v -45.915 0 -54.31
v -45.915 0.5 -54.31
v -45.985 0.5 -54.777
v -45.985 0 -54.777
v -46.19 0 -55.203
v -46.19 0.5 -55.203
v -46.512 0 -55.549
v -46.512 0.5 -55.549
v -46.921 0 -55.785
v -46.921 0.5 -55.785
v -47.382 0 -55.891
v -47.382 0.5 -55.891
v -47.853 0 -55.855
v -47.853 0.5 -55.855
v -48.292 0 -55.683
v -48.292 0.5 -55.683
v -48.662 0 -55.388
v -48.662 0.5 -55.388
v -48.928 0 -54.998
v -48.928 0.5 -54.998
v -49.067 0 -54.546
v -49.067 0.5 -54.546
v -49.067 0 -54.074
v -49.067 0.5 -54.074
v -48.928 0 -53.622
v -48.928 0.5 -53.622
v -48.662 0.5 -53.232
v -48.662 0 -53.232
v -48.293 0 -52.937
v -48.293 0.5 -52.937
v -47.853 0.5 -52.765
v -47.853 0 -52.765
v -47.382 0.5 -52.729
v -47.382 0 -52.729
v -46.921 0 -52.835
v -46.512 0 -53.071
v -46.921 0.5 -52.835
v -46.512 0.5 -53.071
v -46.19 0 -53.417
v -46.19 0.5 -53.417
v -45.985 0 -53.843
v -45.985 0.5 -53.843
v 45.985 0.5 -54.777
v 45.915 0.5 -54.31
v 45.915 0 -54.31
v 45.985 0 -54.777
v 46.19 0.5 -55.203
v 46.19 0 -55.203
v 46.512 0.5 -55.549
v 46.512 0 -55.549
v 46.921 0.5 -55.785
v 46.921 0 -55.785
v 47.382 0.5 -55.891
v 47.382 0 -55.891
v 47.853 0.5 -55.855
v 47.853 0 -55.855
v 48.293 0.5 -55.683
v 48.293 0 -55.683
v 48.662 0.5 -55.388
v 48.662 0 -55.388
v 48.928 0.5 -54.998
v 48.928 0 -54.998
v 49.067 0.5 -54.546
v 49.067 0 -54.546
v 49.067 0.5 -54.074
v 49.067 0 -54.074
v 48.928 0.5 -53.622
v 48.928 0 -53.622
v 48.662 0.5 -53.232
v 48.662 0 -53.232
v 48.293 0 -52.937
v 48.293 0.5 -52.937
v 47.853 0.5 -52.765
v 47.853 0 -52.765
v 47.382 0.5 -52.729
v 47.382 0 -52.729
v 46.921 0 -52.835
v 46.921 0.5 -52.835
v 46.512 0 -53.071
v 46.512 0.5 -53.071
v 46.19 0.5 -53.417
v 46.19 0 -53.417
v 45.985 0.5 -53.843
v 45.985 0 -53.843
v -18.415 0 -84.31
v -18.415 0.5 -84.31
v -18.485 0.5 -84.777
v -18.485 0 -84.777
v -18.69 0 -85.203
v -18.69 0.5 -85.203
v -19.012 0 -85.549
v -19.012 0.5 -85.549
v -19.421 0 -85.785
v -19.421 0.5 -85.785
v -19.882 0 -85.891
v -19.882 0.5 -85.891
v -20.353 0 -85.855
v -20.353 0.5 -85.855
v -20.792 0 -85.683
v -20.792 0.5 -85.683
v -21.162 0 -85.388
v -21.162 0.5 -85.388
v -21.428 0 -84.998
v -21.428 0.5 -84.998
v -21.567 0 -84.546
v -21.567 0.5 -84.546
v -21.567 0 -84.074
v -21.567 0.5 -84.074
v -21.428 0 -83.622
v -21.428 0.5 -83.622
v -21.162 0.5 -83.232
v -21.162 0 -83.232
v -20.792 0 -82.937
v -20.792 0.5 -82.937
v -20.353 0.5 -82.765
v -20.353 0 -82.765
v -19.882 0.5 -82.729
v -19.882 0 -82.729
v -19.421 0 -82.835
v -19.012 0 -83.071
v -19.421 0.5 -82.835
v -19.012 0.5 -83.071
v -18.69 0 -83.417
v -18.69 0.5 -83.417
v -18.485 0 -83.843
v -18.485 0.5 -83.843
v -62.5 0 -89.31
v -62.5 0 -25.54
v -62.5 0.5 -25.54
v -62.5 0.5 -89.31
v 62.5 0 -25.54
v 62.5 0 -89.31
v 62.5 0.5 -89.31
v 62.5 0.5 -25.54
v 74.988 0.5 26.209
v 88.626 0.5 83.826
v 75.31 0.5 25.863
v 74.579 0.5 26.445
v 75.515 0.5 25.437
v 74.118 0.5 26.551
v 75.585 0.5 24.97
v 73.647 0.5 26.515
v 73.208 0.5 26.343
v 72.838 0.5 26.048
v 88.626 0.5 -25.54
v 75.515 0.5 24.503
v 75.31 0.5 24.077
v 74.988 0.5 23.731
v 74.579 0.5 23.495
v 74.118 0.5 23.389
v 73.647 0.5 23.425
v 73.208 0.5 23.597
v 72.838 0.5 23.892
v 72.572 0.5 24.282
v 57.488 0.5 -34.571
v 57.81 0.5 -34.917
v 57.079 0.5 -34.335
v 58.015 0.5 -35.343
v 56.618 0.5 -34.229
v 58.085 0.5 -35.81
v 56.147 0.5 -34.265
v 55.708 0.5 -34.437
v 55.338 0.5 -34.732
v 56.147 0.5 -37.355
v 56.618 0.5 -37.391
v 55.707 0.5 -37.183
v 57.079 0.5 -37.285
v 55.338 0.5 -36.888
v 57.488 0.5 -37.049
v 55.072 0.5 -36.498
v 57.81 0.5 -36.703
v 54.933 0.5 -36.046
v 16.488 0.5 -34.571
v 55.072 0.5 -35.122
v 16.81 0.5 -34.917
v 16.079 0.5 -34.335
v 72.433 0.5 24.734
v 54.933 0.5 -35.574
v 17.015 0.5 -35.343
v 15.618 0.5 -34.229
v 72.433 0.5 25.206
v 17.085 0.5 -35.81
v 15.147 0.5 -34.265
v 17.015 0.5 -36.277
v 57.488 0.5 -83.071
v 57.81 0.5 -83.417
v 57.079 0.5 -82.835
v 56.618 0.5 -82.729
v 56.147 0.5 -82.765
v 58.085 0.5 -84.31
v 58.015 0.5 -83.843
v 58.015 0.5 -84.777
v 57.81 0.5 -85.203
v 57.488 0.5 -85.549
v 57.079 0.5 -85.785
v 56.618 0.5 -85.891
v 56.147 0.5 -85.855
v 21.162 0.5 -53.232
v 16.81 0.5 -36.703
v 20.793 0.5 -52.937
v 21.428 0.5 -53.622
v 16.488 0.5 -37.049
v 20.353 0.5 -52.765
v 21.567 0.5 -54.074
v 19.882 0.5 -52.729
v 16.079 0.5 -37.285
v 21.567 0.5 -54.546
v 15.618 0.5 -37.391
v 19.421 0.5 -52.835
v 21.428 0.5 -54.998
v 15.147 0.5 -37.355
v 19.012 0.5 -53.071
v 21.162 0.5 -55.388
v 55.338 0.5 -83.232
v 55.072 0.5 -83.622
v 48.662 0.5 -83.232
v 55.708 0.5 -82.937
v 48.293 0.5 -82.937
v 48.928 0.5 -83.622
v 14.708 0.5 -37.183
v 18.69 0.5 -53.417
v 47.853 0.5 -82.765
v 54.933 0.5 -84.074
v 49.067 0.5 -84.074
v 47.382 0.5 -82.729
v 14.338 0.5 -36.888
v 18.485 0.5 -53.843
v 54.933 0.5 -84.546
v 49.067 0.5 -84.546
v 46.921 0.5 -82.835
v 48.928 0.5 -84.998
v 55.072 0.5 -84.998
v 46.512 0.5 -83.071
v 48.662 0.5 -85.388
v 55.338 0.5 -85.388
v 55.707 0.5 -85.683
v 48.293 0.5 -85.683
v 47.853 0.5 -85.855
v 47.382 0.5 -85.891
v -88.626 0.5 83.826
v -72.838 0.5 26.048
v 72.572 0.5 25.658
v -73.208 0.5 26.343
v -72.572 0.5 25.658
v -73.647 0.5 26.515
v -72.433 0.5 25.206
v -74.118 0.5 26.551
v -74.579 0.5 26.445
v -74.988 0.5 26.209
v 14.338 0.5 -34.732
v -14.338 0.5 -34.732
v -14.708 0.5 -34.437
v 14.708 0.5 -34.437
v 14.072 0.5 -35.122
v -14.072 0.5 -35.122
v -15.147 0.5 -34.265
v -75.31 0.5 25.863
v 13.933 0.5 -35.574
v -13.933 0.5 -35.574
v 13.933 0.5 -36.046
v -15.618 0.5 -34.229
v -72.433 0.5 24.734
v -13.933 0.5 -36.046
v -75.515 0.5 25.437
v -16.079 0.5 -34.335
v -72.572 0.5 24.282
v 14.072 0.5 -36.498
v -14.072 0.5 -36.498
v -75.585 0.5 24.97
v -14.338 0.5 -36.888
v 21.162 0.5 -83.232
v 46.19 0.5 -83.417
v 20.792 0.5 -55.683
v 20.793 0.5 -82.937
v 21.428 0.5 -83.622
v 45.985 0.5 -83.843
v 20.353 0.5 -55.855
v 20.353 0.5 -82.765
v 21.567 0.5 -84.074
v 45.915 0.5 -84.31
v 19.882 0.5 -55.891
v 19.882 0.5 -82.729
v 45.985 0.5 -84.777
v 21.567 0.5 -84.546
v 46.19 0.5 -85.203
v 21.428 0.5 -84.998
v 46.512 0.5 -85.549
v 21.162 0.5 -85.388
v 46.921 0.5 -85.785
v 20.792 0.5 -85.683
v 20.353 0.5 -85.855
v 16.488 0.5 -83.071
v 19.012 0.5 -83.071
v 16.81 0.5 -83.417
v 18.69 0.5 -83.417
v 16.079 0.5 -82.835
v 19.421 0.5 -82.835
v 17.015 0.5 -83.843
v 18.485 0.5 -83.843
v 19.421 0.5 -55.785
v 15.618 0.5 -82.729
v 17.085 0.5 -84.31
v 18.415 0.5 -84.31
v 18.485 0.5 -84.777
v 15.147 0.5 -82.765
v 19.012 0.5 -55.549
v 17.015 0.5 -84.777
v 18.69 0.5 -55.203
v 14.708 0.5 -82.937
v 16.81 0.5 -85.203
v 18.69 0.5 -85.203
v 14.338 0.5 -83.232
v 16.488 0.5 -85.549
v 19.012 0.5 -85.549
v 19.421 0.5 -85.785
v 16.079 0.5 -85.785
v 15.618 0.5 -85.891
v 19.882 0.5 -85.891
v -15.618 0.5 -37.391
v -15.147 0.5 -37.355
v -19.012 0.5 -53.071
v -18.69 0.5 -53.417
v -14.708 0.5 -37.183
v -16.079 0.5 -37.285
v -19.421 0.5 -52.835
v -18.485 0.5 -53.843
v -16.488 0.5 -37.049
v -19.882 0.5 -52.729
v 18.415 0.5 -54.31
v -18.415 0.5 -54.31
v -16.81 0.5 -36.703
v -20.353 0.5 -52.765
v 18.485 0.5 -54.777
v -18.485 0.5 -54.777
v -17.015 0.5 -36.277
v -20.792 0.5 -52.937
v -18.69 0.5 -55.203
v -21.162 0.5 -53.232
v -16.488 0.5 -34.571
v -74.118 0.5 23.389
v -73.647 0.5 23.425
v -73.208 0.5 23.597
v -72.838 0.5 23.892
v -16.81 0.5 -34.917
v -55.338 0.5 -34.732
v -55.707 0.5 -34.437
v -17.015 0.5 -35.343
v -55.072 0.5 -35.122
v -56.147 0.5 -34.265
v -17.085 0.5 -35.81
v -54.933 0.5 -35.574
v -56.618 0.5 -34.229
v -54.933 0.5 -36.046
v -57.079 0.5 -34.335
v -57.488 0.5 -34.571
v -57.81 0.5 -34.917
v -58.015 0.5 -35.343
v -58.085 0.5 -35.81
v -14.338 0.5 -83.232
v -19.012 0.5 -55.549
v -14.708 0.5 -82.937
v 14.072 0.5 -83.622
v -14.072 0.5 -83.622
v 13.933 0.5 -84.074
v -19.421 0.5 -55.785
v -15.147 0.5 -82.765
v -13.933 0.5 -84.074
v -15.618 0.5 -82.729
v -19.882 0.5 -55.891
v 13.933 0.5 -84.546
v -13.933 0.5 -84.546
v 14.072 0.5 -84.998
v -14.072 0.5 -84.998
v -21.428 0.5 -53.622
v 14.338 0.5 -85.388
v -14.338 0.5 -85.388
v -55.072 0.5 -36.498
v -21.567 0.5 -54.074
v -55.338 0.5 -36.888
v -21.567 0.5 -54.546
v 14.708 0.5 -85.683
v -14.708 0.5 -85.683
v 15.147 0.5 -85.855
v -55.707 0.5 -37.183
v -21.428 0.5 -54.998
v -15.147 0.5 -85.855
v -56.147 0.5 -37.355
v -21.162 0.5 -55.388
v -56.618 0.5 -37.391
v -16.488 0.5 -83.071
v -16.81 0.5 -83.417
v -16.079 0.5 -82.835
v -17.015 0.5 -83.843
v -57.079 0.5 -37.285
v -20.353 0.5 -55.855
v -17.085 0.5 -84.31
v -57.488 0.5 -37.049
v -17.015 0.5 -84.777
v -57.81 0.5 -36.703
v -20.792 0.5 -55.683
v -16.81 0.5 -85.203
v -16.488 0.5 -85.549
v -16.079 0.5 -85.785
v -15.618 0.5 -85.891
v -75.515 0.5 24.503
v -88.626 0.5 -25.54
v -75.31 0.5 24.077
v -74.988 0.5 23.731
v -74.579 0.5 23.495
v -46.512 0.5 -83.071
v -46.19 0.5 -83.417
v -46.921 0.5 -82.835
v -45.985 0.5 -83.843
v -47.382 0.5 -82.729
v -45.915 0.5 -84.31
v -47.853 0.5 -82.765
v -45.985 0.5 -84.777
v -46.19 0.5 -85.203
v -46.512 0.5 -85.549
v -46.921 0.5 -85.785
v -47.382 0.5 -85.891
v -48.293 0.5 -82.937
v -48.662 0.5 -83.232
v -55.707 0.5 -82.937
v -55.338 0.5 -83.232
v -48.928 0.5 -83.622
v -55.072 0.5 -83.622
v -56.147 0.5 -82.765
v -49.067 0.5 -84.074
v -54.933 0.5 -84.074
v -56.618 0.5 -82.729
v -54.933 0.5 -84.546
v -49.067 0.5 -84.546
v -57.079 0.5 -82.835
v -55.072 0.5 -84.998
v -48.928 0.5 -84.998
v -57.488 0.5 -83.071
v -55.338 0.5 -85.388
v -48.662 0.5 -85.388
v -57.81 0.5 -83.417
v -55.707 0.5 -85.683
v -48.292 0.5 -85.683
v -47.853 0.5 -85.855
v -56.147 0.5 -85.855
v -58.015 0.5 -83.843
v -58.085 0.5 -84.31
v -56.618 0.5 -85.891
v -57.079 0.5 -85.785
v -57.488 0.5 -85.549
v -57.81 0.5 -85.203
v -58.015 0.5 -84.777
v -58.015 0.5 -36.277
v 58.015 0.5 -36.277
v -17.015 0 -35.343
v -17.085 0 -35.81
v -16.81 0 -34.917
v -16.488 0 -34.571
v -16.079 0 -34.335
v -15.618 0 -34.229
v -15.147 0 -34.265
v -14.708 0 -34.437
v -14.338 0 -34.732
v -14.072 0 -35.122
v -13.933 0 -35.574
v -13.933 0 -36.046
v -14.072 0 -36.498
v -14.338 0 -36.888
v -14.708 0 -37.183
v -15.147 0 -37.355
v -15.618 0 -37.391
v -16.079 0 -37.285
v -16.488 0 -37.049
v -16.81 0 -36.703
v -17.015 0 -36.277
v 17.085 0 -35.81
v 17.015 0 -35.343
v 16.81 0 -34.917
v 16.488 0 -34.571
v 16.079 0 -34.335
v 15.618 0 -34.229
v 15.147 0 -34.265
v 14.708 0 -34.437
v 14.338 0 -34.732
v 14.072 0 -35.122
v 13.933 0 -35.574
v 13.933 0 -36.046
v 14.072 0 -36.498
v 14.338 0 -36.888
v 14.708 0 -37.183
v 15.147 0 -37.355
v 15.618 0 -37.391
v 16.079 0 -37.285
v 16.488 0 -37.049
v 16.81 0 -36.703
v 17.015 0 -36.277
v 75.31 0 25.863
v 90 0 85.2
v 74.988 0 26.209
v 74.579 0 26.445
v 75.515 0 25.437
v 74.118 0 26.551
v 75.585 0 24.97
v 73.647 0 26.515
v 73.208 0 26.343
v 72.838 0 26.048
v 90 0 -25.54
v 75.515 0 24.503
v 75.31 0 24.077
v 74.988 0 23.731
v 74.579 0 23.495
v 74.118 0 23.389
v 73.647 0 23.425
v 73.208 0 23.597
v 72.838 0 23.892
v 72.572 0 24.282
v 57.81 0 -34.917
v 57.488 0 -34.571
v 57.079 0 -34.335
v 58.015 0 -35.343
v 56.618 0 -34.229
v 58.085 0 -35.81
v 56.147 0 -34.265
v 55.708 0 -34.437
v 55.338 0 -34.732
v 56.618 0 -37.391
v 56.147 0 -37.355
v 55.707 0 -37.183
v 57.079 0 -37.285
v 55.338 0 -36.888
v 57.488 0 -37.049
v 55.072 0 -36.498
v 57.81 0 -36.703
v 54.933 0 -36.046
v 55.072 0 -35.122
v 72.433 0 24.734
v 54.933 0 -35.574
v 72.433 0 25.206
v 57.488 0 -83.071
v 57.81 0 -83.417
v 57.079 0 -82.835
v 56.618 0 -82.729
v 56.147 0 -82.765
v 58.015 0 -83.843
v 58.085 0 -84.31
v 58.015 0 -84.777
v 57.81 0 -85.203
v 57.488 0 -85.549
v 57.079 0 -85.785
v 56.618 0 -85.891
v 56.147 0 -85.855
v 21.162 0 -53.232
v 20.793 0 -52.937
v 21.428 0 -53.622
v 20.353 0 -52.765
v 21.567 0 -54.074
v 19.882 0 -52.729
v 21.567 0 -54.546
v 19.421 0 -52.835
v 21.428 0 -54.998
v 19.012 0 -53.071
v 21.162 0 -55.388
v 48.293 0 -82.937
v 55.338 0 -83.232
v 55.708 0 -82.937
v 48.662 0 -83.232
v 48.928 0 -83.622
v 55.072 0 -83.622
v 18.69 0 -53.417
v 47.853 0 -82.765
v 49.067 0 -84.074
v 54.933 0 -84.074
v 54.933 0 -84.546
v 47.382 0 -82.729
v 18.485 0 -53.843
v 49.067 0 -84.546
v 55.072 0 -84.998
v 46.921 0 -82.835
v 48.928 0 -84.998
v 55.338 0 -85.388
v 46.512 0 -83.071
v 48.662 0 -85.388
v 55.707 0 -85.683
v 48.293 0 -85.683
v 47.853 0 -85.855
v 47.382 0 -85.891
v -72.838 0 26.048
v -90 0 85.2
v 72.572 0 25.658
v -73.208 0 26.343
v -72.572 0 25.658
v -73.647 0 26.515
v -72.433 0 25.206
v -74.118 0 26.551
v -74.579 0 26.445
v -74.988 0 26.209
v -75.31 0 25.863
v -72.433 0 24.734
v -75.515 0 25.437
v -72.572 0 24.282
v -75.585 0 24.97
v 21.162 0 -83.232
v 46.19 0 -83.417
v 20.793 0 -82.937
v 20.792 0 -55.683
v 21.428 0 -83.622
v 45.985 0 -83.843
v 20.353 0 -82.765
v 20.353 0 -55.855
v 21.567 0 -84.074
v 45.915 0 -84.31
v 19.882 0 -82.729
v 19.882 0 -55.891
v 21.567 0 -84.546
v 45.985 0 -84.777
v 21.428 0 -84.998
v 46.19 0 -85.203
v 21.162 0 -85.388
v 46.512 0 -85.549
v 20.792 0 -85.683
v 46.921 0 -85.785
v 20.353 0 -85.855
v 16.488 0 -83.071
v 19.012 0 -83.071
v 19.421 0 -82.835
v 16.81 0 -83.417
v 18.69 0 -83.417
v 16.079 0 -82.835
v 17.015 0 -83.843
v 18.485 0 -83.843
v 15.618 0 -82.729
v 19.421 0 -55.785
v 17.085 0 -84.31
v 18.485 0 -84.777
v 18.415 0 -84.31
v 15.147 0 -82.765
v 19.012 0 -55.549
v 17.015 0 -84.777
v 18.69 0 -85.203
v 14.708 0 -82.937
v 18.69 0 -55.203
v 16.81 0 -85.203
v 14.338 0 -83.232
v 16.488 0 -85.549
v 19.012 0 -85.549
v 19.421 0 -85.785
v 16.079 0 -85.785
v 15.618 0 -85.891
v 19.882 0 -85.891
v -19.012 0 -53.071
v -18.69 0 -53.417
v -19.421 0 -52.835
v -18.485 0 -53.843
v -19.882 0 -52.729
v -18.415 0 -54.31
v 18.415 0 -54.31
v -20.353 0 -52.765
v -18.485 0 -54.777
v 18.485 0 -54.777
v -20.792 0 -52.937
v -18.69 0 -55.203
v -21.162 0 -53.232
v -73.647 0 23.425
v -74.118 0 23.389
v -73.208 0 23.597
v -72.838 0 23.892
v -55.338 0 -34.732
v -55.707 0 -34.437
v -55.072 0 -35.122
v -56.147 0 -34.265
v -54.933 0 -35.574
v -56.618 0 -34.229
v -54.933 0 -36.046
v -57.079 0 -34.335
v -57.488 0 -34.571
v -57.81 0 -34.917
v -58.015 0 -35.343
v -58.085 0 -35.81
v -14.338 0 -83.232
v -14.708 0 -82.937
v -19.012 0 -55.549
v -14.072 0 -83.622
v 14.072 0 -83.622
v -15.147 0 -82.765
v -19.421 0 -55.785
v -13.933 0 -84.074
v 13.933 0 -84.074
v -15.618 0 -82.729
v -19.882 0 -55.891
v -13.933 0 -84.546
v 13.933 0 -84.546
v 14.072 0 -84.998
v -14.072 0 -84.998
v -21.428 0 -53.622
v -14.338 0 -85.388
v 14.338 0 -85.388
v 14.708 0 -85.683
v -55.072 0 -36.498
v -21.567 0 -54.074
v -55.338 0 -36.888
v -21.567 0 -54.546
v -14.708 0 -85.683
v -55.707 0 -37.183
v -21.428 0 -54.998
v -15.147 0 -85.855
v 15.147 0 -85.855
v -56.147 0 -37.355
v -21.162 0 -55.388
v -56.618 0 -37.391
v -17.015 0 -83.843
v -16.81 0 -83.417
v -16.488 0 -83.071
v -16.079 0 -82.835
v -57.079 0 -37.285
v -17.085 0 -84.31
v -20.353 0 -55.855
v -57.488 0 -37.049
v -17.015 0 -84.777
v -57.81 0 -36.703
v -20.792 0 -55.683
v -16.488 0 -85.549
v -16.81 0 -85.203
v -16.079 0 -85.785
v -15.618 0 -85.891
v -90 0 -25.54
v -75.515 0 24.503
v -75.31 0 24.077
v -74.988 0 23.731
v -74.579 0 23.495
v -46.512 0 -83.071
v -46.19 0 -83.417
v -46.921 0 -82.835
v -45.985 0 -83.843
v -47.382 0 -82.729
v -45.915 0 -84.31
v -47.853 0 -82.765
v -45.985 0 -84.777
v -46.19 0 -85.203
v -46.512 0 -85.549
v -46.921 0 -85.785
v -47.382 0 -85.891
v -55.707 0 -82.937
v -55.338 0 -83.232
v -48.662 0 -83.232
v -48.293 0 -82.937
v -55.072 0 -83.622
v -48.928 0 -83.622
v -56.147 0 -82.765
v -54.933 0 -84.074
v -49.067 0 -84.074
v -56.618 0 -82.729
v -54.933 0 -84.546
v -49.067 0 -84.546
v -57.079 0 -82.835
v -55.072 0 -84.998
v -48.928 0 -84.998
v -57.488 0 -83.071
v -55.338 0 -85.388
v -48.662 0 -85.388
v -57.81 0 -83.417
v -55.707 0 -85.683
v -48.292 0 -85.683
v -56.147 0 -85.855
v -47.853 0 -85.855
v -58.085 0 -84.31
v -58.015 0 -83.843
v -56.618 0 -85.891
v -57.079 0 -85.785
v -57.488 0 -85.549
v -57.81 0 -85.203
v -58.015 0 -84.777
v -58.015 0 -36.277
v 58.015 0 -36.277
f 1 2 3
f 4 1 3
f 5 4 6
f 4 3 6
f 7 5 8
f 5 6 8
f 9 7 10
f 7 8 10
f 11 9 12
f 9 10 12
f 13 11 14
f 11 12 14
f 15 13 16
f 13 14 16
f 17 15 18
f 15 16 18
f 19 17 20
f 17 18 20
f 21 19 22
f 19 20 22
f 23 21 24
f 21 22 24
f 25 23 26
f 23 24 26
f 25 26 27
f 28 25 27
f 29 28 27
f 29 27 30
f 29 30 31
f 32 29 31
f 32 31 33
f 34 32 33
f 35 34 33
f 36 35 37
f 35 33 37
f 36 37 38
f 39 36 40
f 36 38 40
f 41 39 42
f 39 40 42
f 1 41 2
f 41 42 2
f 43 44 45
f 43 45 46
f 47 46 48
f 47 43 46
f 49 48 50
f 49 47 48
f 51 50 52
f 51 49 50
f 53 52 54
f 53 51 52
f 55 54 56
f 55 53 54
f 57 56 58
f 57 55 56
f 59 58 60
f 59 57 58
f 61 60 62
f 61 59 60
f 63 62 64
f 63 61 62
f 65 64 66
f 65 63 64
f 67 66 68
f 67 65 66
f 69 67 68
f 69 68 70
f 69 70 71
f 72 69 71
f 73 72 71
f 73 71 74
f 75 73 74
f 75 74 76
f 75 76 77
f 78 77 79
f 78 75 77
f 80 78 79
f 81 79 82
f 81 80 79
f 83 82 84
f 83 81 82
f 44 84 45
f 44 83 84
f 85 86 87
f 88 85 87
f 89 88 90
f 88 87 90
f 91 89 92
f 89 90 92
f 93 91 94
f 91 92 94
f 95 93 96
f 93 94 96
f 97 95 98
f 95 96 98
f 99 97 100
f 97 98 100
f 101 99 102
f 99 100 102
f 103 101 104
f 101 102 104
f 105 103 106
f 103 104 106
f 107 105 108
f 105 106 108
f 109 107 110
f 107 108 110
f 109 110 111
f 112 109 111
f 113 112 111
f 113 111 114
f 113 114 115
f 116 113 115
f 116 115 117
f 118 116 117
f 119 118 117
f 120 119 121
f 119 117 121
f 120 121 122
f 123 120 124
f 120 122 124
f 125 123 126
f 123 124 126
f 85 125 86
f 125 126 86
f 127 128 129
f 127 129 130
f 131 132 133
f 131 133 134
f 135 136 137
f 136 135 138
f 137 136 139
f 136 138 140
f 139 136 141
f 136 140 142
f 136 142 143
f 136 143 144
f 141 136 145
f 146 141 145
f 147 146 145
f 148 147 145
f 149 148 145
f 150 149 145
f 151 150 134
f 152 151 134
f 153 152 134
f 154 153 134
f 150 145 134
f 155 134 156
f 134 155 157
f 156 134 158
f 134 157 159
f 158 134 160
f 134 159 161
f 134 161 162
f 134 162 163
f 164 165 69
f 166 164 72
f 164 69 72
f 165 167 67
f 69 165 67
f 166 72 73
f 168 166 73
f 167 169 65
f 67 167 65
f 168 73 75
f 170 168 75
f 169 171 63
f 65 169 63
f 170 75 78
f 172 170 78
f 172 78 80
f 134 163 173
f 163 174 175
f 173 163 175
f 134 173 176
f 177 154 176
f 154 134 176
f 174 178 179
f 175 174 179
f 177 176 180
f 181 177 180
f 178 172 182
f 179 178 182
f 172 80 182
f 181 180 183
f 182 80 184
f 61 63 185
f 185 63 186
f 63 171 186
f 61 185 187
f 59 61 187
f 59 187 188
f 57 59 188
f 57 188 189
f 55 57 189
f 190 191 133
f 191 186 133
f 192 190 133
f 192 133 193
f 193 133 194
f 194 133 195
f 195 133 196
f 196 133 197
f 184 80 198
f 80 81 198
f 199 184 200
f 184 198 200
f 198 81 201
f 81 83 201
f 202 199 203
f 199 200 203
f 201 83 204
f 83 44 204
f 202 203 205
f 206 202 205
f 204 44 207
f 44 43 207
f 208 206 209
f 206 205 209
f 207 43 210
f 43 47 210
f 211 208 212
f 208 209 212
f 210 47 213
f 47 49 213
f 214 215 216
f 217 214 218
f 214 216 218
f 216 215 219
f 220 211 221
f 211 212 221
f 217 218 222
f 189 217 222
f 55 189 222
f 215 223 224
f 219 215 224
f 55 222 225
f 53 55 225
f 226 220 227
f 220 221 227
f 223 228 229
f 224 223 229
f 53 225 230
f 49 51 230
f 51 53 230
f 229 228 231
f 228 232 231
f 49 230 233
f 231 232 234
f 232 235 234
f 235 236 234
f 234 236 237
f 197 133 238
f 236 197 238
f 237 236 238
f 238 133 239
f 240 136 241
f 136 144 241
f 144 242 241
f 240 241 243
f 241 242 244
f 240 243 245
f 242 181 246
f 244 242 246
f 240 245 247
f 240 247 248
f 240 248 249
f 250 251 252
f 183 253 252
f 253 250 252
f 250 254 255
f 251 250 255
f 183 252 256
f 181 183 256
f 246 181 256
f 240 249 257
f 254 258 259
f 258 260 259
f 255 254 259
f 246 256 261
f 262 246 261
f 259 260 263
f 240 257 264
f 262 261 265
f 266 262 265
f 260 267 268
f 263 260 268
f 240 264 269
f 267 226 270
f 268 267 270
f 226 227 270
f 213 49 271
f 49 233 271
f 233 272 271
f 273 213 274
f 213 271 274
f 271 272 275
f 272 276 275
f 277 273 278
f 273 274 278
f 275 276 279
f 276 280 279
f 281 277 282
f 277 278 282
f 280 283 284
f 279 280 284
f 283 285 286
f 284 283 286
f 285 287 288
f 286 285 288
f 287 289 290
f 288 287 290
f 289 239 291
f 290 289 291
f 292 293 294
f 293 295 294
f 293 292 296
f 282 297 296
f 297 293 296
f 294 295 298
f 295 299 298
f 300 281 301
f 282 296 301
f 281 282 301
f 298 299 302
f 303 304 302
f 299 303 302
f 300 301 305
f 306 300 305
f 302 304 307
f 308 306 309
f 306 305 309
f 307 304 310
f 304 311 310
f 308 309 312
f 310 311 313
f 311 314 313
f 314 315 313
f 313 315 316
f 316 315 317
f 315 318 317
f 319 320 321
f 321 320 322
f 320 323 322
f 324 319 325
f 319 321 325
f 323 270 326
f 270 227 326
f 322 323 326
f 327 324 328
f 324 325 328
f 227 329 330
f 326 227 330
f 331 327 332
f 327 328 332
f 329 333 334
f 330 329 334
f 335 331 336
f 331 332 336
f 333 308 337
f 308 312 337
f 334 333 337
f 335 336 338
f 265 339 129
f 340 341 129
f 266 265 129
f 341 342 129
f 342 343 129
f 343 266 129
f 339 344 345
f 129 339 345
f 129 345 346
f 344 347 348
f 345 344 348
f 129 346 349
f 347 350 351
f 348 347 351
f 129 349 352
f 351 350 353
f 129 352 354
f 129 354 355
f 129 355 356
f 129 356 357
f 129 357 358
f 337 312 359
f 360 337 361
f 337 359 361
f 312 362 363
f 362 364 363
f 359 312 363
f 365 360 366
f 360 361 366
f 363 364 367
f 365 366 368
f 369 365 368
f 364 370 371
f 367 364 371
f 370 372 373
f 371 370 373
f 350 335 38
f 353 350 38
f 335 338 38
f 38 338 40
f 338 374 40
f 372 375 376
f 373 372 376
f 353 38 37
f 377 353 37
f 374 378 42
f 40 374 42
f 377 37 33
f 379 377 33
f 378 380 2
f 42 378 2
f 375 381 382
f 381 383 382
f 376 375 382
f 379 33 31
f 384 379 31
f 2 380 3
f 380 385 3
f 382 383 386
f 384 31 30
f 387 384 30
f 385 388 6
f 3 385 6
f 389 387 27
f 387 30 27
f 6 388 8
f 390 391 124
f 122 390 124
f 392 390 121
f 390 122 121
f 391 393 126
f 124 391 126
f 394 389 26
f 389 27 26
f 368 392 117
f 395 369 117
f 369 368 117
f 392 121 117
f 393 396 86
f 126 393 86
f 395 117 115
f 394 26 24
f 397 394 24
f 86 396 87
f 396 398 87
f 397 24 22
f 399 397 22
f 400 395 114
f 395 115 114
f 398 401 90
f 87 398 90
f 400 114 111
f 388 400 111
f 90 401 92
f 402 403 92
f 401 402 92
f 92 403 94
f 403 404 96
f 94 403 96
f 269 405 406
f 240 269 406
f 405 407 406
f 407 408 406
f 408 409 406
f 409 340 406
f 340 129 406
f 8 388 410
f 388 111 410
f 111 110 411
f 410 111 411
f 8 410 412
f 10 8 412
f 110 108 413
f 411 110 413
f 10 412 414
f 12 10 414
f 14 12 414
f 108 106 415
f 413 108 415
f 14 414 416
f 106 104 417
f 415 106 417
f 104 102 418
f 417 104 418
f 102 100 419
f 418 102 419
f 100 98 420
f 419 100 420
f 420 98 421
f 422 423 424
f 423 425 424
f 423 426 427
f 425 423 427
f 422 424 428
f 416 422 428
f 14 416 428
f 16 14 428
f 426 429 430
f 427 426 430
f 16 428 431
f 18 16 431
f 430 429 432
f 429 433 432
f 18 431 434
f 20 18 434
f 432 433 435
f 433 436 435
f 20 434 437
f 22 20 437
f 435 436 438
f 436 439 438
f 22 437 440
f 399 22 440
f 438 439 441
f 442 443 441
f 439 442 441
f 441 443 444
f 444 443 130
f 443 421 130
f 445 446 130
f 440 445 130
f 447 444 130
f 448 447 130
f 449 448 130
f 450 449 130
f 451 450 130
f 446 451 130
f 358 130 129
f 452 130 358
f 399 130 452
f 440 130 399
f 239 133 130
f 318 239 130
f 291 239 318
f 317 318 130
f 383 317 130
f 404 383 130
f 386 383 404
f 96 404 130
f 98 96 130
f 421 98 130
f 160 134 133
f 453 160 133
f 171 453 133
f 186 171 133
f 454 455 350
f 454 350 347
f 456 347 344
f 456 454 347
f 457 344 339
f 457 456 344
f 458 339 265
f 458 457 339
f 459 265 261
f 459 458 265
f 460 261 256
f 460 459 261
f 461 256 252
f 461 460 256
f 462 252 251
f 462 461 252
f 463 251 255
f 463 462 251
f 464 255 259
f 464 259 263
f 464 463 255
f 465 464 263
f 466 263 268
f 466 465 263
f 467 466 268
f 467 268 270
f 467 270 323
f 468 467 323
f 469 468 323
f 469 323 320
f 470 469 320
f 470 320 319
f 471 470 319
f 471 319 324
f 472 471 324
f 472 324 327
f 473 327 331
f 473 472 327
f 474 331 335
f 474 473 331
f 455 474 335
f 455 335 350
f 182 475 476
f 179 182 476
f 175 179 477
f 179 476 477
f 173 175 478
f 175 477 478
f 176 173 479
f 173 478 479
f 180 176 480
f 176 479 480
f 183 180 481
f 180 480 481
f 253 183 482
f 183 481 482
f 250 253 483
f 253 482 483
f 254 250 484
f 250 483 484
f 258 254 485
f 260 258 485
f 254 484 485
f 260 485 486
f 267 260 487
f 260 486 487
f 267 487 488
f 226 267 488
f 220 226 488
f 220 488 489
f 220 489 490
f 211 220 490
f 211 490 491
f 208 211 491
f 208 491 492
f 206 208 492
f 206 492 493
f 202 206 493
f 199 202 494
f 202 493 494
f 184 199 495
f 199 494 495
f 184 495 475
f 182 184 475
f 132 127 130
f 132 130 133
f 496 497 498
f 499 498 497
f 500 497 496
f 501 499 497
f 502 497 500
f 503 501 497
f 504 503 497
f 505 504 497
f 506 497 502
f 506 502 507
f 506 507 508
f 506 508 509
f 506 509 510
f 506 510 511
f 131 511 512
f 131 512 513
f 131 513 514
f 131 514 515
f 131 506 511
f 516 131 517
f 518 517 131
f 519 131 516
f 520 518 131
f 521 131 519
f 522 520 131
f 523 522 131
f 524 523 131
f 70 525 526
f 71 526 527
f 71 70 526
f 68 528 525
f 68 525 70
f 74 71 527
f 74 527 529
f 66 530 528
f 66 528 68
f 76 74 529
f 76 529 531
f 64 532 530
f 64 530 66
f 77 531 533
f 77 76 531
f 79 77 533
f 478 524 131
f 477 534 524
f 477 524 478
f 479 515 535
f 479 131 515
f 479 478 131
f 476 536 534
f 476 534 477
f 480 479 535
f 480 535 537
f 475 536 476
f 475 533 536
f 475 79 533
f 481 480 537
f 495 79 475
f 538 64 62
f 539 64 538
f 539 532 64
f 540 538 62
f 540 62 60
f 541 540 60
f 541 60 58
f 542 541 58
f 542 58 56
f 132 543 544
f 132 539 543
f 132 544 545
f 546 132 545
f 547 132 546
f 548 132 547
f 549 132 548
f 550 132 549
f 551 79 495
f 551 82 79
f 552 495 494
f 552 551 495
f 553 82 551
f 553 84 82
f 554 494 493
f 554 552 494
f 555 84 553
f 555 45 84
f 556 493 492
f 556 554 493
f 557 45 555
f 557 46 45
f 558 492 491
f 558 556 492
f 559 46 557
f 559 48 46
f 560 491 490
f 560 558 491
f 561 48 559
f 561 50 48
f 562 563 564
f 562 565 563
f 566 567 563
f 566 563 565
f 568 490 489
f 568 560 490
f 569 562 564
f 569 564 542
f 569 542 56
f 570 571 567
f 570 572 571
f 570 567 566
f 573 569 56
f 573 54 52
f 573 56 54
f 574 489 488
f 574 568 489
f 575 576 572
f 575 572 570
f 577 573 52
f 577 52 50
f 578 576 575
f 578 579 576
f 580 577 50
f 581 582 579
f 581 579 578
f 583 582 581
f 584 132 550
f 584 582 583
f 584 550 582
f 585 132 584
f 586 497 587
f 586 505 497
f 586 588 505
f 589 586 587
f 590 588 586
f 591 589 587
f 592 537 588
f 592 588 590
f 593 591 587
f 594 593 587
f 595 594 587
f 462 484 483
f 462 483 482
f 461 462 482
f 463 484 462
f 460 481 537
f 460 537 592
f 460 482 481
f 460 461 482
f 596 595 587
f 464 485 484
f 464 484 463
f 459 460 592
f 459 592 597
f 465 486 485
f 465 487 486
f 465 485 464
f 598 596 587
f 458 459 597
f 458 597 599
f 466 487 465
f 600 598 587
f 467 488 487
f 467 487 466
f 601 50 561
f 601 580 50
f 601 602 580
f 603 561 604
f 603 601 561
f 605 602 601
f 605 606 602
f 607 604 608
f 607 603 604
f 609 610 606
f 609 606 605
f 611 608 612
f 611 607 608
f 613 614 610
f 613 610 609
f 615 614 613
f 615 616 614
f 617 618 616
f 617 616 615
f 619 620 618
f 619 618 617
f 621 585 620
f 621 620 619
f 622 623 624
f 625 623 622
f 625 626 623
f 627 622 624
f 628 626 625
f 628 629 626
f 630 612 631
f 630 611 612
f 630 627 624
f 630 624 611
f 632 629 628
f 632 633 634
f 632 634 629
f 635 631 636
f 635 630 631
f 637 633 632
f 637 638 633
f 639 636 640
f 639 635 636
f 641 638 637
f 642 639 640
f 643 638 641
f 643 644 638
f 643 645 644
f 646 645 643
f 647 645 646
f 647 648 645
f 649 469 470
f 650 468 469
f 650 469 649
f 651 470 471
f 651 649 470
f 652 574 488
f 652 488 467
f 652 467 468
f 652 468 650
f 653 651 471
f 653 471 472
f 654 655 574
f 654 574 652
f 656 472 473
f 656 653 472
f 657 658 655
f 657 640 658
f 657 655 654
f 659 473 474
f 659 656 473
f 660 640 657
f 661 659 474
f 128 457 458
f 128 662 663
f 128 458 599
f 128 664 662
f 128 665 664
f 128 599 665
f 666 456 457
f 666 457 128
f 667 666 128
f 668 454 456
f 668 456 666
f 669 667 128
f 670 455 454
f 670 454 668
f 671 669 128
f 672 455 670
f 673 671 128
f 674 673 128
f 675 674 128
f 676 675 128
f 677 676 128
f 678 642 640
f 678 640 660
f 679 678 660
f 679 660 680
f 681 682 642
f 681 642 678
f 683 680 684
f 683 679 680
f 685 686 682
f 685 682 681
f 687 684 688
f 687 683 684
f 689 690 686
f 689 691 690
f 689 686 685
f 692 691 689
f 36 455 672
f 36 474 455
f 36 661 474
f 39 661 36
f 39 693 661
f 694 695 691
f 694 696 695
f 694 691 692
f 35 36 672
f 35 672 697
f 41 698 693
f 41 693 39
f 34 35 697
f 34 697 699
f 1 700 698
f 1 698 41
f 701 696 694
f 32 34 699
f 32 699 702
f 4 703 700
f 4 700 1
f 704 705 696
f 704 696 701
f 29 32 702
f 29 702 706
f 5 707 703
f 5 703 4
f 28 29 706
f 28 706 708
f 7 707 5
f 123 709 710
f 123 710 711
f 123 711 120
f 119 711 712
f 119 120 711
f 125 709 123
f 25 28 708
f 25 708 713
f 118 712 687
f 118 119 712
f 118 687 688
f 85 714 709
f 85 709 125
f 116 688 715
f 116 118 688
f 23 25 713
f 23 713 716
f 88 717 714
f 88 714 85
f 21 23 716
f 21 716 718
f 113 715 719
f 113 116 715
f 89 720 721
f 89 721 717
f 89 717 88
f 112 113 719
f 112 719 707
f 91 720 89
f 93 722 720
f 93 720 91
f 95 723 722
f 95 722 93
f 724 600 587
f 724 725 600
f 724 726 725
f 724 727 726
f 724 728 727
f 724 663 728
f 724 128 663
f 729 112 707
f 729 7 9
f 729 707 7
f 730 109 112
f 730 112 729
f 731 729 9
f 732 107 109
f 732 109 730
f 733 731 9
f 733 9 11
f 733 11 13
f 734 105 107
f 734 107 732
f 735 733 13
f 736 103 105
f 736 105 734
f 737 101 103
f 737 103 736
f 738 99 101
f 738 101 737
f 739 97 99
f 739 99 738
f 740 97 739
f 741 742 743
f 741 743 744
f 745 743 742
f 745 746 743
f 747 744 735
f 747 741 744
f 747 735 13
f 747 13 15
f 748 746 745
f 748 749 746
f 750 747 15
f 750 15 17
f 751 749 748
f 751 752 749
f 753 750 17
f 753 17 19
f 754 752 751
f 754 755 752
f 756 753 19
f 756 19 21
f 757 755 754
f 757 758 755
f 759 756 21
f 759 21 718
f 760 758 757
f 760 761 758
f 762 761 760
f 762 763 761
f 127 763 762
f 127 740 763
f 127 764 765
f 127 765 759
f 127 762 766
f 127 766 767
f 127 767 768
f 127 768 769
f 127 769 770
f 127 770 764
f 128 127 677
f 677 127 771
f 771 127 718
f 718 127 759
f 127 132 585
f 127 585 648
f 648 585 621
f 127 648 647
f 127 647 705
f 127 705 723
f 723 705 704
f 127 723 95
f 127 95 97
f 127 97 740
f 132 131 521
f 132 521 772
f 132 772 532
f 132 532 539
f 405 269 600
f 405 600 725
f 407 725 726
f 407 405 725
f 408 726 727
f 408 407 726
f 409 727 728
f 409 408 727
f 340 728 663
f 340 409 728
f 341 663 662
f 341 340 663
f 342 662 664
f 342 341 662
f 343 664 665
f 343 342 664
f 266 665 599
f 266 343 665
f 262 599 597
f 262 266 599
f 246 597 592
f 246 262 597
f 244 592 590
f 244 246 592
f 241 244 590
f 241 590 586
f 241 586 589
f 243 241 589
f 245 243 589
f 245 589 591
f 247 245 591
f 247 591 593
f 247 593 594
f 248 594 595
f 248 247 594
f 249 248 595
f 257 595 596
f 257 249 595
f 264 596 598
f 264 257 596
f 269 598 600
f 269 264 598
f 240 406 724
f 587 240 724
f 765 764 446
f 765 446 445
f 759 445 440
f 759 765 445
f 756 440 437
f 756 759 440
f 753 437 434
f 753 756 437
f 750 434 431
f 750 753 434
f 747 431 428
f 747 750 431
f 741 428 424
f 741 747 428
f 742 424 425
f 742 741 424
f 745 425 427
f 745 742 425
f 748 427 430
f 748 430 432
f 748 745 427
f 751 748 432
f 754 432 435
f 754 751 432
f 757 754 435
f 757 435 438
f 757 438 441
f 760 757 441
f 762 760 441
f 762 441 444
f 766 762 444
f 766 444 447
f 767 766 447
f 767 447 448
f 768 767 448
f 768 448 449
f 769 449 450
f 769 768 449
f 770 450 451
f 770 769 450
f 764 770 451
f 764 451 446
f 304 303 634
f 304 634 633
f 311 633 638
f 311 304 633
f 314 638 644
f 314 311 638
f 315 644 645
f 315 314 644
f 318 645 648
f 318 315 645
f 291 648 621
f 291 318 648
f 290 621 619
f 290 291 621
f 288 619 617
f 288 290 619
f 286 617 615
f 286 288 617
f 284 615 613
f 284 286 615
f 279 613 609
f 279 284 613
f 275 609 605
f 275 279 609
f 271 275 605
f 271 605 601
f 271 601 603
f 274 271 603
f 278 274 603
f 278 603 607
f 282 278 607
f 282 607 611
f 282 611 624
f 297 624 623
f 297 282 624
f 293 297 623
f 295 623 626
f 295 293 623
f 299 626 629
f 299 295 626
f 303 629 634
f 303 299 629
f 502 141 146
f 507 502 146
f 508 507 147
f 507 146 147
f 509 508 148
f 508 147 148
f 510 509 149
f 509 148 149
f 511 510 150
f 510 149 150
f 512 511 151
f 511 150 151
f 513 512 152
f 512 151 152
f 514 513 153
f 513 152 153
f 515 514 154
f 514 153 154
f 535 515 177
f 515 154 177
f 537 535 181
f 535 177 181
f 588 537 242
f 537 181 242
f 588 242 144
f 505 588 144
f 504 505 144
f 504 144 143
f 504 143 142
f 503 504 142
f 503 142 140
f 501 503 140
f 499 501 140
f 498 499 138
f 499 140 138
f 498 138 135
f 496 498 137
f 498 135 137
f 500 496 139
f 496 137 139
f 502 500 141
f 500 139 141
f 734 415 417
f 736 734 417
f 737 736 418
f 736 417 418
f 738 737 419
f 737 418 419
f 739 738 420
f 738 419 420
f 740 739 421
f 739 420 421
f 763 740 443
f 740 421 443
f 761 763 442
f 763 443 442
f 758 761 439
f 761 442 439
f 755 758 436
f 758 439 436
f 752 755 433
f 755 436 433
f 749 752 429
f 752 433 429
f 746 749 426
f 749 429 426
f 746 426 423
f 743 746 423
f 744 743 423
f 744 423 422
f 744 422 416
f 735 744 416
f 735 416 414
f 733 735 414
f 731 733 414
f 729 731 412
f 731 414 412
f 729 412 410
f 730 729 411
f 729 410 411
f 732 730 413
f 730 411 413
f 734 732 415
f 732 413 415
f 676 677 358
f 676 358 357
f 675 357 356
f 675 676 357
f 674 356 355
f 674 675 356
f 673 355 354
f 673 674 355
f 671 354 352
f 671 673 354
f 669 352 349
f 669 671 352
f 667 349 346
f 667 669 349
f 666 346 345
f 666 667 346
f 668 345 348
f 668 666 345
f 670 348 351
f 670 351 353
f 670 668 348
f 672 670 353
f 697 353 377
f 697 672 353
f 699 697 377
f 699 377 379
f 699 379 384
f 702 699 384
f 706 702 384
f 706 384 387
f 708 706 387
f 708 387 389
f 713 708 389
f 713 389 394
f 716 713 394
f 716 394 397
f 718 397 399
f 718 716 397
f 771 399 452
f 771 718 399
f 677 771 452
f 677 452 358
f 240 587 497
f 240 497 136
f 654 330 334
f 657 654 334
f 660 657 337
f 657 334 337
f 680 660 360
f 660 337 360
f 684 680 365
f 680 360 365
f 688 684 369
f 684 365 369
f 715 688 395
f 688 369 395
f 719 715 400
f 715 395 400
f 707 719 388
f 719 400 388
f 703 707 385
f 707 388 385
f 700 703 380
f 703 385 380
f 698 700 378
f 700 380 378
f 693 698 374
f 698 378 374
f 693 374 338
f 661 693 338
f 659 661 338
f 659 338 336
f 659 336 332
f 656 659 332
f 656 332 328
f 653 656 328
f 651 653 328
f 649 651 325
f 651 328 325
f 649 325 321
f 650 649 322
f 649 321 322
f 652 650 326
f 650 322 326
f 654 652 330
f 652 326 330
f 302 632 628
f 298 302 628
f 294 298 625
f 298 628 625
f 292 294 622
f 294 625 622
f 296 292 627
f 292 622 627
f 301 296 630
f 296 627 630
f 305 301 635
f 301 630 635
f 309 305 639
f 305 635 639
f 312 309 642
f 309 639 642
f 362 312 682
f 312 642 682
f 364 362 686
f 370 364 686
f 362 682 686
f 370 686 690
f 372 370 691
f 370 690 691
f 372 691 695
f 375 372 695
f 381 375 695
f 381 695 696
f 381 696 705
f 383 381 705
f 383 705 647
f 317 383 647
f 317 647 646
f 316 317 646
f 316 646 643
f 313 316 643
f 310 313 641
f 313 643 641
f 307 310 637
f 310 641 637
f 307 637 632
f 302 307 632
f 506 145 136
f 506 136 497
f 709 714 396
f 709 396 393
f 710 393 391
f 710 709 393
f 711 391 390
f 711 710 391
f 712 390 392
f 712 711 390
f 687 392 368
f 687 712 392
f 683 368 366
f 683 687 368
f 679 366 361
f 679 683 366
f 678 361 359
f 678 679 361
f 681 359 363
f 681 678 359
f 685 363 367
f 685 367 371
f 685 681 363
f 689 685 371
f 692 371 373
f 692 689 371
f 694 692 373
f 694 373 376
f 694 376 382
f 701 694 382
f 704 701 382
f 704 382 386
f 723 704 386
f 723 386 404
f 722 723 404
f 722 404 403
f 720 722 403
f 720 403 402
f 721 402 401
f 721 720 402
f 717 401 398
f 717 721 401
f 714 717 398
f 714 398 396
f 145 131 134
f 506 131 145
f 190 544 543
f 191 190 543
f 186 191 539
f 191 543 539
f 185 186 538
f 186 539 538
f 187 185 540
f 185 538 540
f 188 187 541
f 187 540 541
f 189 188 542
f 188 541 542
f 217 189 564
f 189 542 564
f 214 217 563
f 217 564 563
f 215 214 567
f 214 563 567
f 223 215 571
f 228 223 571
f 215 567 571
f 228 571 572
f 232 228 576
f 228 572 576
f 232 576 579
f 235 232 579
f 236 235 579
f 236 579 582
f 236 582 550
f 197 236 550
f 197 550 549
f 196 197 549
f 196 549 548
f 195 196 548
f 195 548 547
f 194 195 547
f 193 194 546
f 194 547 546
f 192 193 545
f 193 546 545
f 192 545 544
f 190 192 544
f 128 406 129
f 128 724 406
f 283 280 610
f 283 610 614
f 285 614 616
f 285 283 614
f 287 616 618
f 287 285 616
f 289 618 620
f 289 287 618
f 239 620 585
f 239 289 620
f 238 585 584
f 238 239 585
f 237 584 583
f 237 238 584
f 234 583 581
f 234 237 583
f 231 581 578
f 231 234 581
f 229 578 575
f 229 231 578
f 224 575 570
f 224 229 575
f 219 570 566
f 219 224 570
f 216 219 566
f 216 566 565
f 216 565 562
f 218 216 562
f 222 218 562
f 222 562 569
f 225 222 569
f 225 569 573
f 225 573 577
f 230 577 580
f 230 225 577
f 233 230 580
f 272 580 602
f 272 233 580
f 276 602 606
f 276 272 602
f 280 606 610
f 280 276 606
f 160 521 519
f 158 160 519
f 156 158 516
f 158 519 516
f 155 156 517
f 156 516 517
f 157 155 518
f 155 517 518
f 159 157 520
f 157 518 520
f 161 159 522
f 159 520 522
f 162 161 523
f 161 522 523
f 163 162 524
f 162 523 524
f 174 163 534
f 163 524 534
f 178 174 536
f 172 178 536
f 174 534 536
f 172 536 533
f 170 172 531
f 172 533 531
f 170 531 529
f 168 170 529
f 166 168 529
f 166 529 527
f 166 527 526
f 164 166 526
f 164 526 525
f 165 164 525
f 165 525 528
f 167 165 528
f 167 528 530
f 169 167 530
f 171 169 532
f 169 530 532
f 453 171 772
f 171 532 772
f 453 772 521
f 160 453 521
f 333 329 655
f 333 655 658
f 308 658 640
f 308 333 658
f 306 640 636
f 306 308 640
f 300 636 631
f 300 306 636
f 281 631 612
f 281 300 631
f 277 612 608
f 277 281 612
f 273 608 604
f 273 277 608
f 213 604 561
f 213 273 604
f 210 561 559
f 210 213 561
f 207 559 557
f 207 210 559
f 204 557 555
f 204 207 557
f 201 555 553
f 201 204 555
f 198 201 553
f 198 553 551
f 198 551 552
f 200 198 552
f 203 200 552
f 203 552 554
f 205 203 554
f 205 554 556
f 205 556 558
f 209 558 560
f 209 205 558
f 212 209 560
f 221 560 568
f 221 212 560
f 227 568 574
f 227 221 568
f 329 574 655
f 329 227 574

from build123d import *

# Parameters (mm, degrees)
SALIENTE_EXTRUIR1_DEPTH = 0.5
CORTAR_EXTRUIR4_REACH   = 2.5
CROQUIS6_R              = 1.585
CORTAR_EXTRUIR5_REACH   = 2.5
CROQUIS7_R              = 1.585
CROQUIS8_R              = 1.585
CORTAR_EXTRUIR6_DEPTH   = 0.5
CROQUIS9_R              = 1.585
CORTAR_EXTRUIR7_DEPTH   = 0.5
CROQUIS5_R              = 1.585
CORTAR_EXTRUIR8_DEPTH   = 0.5
CORTAR_EXTRUIR9_REACH   = 182
CORTAR_EXTRUIR10_START  = -110.74
CORTAR_EXTRUIR10_DEPTH  = 110.74


with BuildPart() as part:
    # Croquis2 → Saliente-Extruir1 (new body)
    with BuildSketch(Plane(origin=(0, 0, 0), x_dir=(1, 0, 0), z_dir=(0, 1, 0))):
        Polygon((-90, 25.54), (-62.5, 25.54), (-62.5, 89.31), (62.5, 89.31), (62.5, 25.54), (90, 25.54), (90, -85.2), (-90, -85.2), align=None)
    saliente_extruir1 = extrude(amount=SALIENTE_EXTRUIR1_DEPTH)

    # Croquis6 → Cortar-Extruir4 (cut, up to next)
    with BuildSketch(Plane(origin=(0, 0.5, 0), x_dir=(1, 0, 0), z_dir=(0, 1, 0)), mode=Mode.PRIVATE) as cortar_extruir4_sk1:
        with Locations((-56.5, 35.81)):
            Circle(CROQUIS6_R)
    cortar_extruir4_tool1 = extrude(cortar_extruir4_sk1.sketch, amount=-CORTAR_EXTRUIR4_REACH, mode=Mode.PRIVATE) & part.part
    add(cortar_extruir4_tool1.solids().sort_by_distance((-56.5, 0.5, -35.81))[0], mode=Mode.SUBTRACT)
    # Croquis6 → Cortar-Extruir4 (cut, up to next)
    with BuildSketch(Plane(origin=(0, 0.5, 0), x_dir=(1, 0, 0), z_dir=(0, 1, 0)), mode=Mode.PRIVATE) as cortar_extruir4_sk2:
        with Locations((-15.5, 35.81)):
            Circle(CROQUIS6_R)
    cortar_extruir4_tool2 = extrude(cortar_extruir4_sk2.sketch, amount=-CORTAR_EXTRUIR4_REACH, mode=Mode.PRIVATE) & part.part
    add(cortar_extruir4_tool2.solids().sort_by_distance((-15.5, 0.5, -35.81))[0], mode=Mode.SUBTRACT)
    # Croquis6 → Cortar-Extruir4 (cut, up to next)
    with BuildSketch(Plane(origin=(0, 0.5, 0), x_dir=(1, 0, 0), z_dir=(0, 1, 0)), mode=Mode.PRIVATE) as cortar_extruir4_sk3:
        with Locations((-15.5, 84.31)):
            Circle(CROQUIS6_R)
    cortar_extruir4_tool3 = extrude(cortar_extruir4_sk3.sketch, amount=-CORTAR_EXTRUIR4_REACH, mode=Mode.PRIVATE) & part.part
    add(cortar_extruir4_tool3.solids().sort_by_distance((-15.5, 0.5, -84.31))[0], mode=Mode.SUBTRACT)
    # Croquis6 → Cortar-Extruir4 (cut, up to next)
    with BuildSketch(Plane(origin=(0, 0.5, 0), x_dir=(1, 0, 0), z_dir=(0, 1, 0)), mode=Mode.PRIVATE) as cortar_extruir4_sk4:
        with Locations((-56.5, 84.31)):
            Circle(CROQUIS6_R)
    cortar_extruir4_tool4 = extrude(cortar_extruir4_sk4.sketch, amount=-CORTAR_EXTRUIR4_REACH, mode=Mode.PRIVATE) & part.part
    add(cortar_extruir4_tool4.solids().sort_by_distance((-56.5, 0.5, -84.31))[0], mode=Mode.SUBTRACT)

    # Croquis7 → Cortar-Extruir5 (cut, up to next)
    with BuildSketch(Plane(origin=(0, 0.5, 0), x_dir=(1, 0, 0), z_dir=(0, 1, 0)), mode=Mode.PRIVATE) as cortar_extruir5_sk1:
        with Locations((56.5, 35.81)):
            Circle(CROQUIS7_R)
    cortar_extruir5_tool1 = extrude(cortar_extruir5_sk1.sketch, amount=-CORTAR_EXTRUIR5_REACH, mode=Mode.PRIVATE) & part.part
    add(cortar_extruir5_tool1.solids().sort_by_distance((56.5, 0.5, -35.81))[0], mode=Mode.SUBTRACT)
    # Croquis7 → Cortar-Extruir5 (cut, up to next)
    with BuildSketch(Plane(origin=(0, 0.5, 0), x_dir=(1, 0, 0), z_dir=(0, 1, 0)), mode=Mode.PRIVATE) as cortar_extruir5_sk2:
        with Locations((15.5, 35.81)):
            Circle(CROQUIS7_R)
    cortar_extruir5_tool2 = extrude(cortar_extruir5_sk2.sketch, amount=-CORTAR_EXTRUIR5_REACH, mode=Mode.PRIVATE) & part.part
    add(cortar_extruir5_tool2.solids().sort_by_distance((15.5, 0.5, -35.81))[0], mode=Mode.SUBTRACT)
    # Croquis7 → Cortar-Extruir5 (cut, up to next)
    with BuildSketch(Plane(origin=(0, 0.5, 0), x_dir=(1, 0, 0), z_dir=(0, 1, 0)), mode=Mode.PRIVATE) as cortar_extruir5_sk3:
        with Locations((15.5, 84.31)):
            Circle(CROQUIS7_R)
    cortar_extruir5_tool3 = extrude(cortar_extruir5_sk3.sketch, amount=-CORTAR_EXTRUIR5_REACH, mode=Mode.PRIVATE) & part.part
    add(cortar_extruir5_tool3.solids().sort_by_distance((15.5, 0.5, -84.31))[0], mode=Mode.SUBTRACT)
    # Croquis7 → Cortar-Extruir5 (cut, up to next)
    with BuildSketch(Plane(origin=(0, 0.5, 0), x_dir=(1, 0, 0), z_dir=(0, 1, 0)), mode=Mode.PRIVATE) as cortar_extruir5_sk4:
        with Locations((56.5, 84.31)):
            Circle(CROQUIS7_R)
    cortar_extruir5_tool4 = extrude(cortar_extruir5_sk4.sketch, amount=-CORTAR_EXTRUIR5_REACH, mode=Mode.PRIVATE) & part.part
    add(cortar_extruir5_tool4.solids().sort_by_distance((56.5, 0.5, -84.31))[0], mode=Mode.SUBTRACT)

    # Simetría3: Saliente-Extruir1 across plane
    add(saliente_extruir1.mirror(Plane(origin=(0, 0, 0), x_dir=(0, 0, 1), z_dir=(1, 0, 0))))

    # Croquis8 → Cortar-Extruir6 (cut)
    with BuildSketch(Plane(origin=(0, 0.5, 0), x_dir=(1, 0, 0), z_dir=(0, 1, 0))):
        with Locations((-20, 54.31)):
            Circle(CROQUIS8_R)
        with Locations((-47.5, 54.31)):
            Circle(CROQUIS8_R)
        with Locations((-47.5, 84.31)):
            Circle(CROQUIS8_R)
        with Locations((-20, 84.31)):
            Circle(CROQUIS8_R)
    cortar_extruir6 = extrude(amount=-CORTAR_EXTRUIR6_DEPTH, mode=Mode.SUBTRACT)

    # Simetría4: Cortar-Extruir6 across plane
    add(cortar_extruir6.mirror(Plane(origin=(0, 0, 0), x_dir=(0, 0, 1), z_dir=(1, 0, 0))), mode=Mode.SUBTRACT)

    # Croquis9 → Cortar-Extruir7 (cut)
    with BuildSketch(Plane.XZ):
        with Locations((56.5, -35.81)):
            Circle(CROQUIS9_R)
        with Locations((15.5, -35.81)):
            Circle(CROQUIS9_R)
        with Locations((15.5, -84.31)):
            Circle(CROQUIS9_R)
        with Locations((56.5, -84.31)):
            Circle(CROQUIS9_R)
    cortar_extruir7 = extrude(amount=-CORTAR_EXTRUIR7_DEPTH, mode=Mode.SUBTRACT)

    # Simetría5: Cortar-Extruir7 across plane
    add(cortar_extruir7.mirror(Plane(origin=(0, 0, 0), x_dir=(0, 0, 1), z_dir=(1, 0, 0))), mode=Mode.SUBTRACT)

    # Croquis5 → Cortar-Extruir8 (cut)
    with BuildSketch(Plane(origin=(0, 0.5, 0), x_dir=(1, 0, 0), z_dir=(0, 1, 0))):
        with Locations((74, -24.969940997)):
            Circle(CROQUIS5_R)
    cortar_extruir8 = extrude(amount=-CORTAR_EXTRUIR8_DEPTH, mode=Mode.SUBTRACT)

    # Simetría6: Cortar-Extruir8 across plane
    add(cortar_extruir8.mirror(Plane(origin=(0, 0, 0), x_dir=(0, 0, 1), z_dir=(1, 0, 0))), mode=Mode.SUBTRACT)

    # Croquis3 → Cortar-Extruir9 (cut, up to next)
    with BuildSketch(Plane(origin=(90, 0, 0), x_dir=(0, 0, -1), z_dir=(1, 0, 0)), mode=Mode.PRIVATE) as cortar_extruir9_sk1:
        Polygon((-85.2, 0), (-83.82626129, 0.5), (-85.2, 0.5), align=None)
    cortar_extruir9_tool1 = extrude(cortar_extruir9_sk1.sketch, amount=-CORTAR_EXTRUIR9_REACH, mode=Mode.PRIVATE) & part.part
    add(cortar_extruir9_tool1.solids().sort_by_distance((90, 0.333333, 84.742087))[0], mode=Mode.SUBTRACT)

    # Croquis10 → Cortar-Extruir10 (cut)
    with BuildSketch(Plane(origin=(0, 0, -25.54), x_dir=(-1, 0, 0), z_dir=(0, 0, -1)).offset(CORTAR_EXTRUIR10_START)):
        Polygon((90, 0), (90, 0.5), (88.62626129, 0.5), align=None)
    cortar_extruir10 = extrude(amount=CORTAR_EXTRUIR10_DEPTH, mode=Mode.SUBTRACT)

    # Simetría7: Cortar-Extruir10 across plane
    add(cortar_extruir10.mirror(Plane(origin=(0, 0, 0), x_dir=(0, 0, 1), z_dir=(1, 0, 0))), mode=Mode.SUBTRACT)


solid = part.part
